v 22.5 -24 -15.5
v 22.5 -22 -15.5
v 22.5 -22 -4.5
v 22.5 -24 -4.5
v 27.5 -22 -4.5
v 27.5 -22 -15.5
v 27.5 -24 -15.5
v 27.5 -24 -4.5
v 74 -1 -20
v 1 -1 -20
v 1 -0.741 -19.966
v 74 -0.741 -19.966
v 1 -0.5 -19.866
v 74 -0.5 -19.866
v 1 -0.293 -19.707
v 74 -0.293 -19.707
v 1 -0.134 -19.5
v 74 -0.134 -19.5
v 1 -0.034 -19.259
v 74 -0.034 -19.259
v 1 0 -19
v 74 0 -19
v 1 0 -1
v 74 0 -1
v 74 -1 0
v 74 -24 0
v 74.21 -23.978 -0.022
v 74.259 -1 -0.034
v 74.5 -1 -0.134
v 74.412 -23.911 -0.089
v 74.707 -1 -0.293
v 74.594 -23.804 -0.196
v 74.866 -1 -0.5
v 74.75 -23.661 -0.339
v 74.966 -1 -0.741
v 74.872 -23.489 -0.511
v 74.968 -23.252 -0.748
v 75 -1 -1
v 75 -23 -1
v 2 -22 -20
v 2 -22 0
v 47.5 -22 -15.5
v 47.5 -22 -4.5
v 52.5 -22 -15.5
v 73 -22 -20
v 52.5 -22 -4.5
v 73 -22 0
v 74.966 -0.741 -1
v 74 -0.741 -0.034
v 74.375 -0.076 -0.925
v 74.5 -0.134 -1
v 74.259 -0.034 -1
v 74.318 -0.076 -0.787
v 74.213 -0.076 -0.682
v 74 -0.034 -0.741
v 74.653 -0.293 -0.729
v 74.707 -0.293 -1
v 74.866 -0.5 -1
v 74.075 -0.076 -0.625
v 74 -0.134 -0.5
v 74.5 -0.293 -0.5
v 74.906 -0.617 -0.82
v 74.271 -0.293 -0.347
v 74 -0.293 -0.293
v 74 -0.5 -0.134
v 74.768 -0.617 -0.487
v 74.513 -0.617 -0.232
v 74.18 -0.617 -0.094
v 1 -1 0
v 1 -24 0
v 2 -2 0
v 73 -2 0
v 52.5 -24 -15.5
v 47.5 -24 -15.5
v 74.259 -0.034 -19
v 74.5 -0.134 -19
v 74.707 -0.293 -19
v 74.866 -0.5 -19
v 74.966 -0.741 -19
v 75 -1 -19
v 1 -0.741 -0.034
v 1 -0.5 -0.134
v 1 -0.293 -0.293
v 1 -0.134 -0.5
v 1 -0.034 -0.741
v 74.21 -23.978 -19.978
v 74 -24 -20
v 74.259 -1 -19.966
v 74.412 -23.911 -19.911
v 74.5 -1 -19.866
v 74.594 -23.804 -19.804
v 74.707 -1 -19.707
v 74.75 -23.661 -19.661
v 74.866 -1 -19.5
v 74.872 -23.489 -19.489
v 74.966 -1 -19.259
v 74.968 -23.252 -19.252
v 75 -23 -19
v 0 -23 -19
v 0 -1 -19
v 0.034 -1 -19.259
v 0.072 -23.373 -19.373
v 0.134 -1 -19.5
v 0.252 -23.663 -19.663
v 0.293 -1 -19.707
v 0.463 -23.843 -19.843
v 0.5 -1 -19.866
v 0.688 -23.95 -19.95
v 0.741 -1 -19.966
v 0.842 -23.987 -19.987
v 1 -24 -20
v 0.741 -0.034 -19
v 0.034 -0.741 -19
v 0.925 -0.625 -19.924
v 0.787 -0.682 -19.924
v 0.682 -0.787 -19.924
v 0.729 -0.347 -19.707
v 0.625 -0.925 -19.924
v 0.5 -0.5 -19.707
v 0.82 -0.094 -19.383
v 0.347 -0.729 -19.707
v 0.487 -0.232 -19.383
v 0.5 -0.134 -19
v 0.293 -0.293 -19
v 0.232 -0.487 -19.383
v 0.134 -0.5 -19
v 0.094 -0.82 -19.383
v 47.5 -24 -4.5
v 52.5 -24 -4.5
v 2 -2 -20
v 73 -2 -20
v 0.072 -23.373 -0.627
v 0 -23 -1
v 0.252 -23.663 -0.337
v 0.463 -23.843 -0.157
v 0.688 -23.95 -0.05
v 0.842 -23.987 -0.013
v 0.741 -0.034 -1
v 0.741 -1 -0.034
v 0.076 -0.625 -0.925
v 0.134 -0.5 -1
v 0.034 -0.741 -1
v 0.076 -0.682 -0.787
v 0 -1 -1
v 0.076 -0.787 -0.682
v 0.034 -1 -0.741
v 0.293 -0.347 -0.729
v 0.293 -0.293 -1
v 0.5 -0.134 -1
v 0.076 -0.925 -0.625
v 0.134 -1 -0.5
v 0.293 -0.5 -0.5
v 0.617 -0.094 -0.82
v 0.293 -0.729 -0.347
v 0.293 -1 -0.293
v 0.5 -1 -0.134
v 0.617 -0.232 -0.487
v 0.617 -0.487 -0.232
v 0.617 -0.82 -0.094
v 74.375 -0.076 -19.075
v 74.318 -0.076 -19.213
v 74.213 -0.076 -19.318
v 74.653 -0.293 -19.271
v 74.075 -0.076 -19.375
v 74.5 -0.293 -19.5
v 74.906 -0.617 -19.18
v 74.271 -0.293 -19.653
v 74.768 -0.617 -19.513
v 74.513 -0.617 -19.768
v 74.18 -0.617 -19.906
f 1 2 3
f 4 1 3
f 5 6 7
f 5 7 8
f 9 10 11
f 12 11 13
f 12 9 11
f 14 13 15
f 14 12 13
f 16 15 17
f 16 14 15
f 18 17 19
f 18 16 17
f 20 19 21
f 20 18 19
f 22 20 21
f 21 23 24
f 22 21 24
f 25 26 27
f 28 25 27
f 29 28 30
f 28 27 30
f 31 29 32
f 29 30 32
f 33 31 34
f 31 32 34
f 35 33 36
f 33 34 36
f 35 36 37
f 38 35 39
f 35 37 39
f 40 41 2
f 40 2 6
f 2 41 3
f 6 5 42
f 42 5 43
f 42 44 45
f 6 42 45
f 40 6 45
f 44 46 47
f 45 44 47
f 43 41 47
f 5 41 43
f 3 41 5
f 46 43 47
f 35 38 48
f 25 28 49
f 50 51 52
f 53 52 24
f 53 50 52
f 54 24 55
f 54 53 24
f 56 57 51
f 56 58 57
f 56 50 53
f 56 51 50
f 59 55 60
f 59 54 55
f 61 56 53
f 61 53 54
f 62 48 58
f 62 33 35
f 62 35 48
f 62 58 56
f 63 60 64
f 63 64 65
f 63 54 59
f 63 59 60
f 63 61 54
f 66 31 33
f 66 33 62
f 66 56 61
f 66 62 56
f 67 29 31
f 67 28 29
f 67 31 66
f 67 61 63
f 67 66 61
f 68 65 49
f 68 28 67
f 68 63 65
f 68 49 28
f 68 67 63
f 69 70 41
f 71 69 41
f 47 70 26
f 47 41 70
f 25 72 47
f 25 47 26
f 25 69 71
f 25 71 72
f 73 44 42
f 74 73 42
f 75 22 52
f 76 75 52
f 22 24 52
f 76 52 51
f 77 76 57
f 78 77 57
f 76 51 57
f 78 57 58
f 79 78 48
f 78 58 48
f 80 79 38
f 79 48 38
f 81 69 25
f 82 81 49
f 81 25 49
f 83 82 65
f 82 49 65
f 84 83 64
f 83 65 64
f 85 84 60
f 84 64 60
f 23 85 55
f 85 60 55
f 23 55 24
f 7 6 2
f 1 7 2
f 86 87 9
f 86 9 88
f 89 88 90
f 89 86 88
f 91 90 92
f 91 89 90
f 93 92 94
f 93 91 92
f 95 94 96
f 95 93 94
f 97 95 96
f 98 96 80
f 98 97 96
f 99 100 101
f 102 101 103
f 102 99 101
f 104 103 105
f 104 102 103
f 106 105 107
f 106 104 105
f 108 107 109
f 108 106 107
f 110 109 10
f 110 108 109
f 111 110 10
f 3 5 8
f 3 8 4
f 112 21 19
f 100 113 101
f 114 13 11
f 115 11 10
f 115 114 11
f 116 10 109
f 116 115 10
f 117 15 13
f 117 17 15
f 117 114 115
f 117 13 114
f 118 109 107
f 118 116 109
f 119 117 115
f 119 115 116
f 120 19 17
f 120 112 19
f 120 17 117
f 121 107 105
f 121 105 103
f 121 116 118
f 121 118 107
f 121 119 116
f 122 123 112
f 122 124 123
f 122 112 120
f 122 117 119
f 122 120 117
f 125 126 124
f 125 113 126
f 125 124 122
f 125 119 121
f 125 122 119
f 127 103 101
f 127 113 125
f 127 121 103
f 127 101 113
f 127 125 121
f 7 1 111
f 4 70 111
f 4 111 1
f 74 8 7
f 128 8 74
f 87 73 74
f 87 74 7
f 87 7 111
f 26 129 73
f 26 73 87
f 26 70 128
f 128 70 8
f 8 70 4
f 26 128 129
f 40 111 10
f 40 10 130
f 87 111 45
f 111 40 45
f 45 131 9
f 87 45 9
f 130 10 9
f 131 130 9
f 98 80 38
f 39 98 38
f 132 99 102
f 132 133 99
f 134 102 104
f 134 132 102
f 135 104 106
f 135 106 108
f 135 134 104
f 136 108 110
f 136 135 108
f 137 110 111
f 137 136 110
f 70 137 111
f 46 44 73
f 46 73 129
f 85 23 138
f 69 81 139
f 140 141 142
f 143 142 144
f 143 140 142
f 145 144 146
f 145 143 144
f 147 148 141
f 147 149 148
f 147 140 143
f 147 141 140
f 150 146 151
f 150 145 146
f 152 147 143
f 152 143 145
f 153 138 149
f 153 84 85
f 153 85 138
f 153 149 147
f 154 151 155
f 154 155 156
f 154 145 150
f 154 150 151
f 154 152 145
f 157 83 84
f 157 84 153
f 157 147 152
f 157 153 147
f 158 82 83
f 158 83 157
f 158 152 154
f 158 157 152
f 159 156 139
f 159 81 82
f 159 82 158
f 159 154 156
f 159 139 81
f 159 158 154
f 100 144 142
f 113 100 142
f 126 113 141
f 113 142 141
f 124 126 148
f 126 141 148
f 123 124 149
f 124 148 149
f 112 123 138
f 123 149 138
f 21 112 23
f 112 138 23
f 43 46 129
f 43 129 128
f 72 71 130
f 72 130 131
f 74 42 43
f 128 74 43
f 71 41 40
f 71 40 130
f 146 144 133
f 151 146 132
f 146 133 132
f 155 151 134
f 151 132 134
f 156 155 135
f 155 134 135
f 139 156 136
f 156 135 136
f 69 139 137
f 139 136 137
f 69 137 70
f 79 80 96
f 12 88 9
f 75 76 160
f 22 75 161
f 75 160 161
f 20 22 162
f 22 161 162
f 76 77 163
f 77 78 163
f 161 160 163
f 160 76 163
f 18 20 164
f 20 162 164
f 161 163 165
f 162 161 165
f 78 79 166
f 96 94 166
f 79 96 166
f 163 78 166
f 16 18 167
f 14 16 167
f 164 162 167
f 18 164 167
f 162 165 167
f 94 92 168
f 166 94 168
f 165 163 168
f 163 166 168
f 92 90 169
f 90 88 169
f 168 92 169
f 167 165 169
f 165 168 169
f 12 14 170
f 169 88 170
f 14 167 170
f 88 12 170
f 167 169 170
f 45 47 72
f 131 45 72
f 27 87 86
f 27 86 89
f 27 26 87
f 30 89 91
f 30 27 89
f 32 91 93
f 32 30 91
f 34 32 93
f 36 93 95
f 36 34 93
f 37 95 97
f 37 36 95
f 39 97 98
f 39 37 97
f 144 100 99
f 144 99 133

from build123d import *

# Parameters (mm, degrees)
F0_W     = 75
F0_H     = 20
F1_DEPTH = 24
F2_W     = 71
F2_H     = 20
F3_DEPTH = 20
F5_W     = 5
F5_H     = 11
F6_DEPTH = 5
F7_R     = 1


with BuildPart() as f1:
    # F0 (on Front) → F1 (new body)
    with BuildSketch(Plane.XZ):
        with Locations((37.5, -10)):
            Rectangle(F0_W, F0_H)
    extrude(amount=F1_DEPTH)

    # F2 (on Top) → F3 (cut, symmetric)
    with BuildSketch(Plane.XY):
        with Locations((37.5, -12)):
            Rectangle(F2_W, F2_H)
    extrude(amount=F3_DEPTH, both=True, mode=Mode.SUBTRACT)

    # F5 (on offset) → F6 (cut)
    with BuildSketch(Plane(origin=(0, -22, 0), x_dir=(-1, 0, 0), z_dir=(0, 1, 0))):
        with Locations((-25, -10)):
            Rectangle(F5_W, F5_H)
        with Locations((-50, -9.9999997467)):
            Rectangle(F5_W, F5_H)
    extrude(amount=-F6_DEPTH, mode=Mode.SUBTRACT)

    # F7
    f7_edges = [f1.edges().sort_by_distance(p)[0] for p in [
        (75, -12, -20),
        (75, -12, 0),
        (75, 0, -10),
        (75, -24, -10),
        (37.5, 0, 0),
        (0, 0, -10),
        (37.5, 0, -20),
        (0, -12, 0),
        (0, -12, -20),
        (0, -24, -10),
    ]]
    fillet(f7_edges, radius=F7_R)


solid = f1.part
